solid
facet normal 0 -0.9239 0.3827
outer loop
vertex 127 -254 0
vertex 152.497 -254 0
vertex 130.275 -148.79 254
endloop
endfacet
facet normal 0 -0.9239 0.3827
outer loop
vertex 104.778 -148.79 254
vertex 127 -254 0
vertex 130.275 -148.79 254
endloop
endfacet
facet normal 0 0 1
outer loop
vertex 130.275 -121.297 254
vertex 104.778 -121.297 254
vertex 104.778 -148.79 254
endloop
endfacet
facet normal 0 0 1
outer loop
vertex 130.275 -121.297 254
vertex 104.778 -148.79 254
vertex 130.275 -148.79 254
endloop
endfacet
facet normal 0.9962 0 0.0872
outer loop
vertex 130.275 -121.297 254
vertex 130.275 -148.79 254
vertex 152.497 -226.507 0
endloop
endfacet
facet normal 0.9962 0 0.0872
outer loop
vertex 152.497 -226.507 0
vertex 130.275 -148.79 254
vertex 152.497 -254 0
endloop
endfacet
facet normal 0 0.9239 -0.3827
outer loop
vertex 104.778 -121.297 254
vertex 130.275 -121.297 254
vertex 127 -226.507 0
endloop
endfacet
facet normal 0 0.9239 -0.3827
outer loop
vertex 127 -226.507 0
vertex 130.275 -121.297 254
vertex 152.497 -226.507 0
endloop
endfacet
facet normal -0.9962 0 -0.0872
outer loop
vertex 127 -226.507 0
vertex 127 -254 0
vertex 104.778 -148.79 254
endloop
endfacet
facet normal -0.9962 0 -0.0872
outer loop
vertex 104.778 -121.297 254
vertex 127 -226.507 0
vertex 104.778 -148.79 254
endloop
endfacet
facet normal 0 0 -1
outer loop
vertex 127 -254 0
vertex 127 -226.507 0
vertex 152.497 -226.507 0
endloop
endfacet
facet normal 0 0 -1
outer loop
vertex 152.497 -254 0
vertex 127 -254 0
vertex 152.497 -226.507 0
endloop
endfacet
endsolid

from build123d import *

# Parameters (mm, degrees)
F0_W     = 185.6569993703
F0_H     = 254
F1_DEPTH = 254
F3_DEPTH = 254.001
F5_DEPTH = 80.8801199059
F6_DEPTH = 80.8801199059
F7_DEPTH = 132.7040067302


with BuildPart() as f1:
    # F0 (on Front) → F1 (new body)
    with BuildSketch(Plane.XZ):
        with Locations((92.8284996852, 127)):
            Rectangle(F0_W, F0_H)
    extrude(amount=F1_DEPTH)

    # F2 (on face) → F3 (cut, through all)
    with BuildSketch(Plane.XZ.offset(254)):
        Polygon((127, 0), (104.7778794644, 254), (0, 254), (0, 0), align=None)
    extrude(amount=-F3_DEPTH, mode=Mode.SUBTRACT)

    # F4 (on face) → F5 (cut, through all)
    with BuildSketch(Plane.YZ.offset(185.6569993703)):
        Polygon((-254, 254), (-254, 0), (-148.7897551572, 254), align=None)
    extrude(amount=-F5_DEPTH, mode=Mode.SUBTRACT)

    # F4 (on face) → F6 (cut, through all)
    with BuildSketch(Plane.YZ.offset(185.6569993703)):
        Polygon((-121.2969932698, 254), (-226.5072381126, 0), (0, 0), (0, 254), align=None)
    extrude(amount=-F6_DEPTH, mode=Mode.SUBTRACT)

    # F2 (on face) → F7 (cut, through all)
    with BuildSketch(Plane.XZ.offset(254)):
        Polygon((185.6569993703, 254), (130.274903338, 254), (152.4970238736, 0), (185.6569993703, 0), align=None)
    extrude(amount=-F7_DEPTH, mode=Mode.SUBTRACT)


solid = f1.part
